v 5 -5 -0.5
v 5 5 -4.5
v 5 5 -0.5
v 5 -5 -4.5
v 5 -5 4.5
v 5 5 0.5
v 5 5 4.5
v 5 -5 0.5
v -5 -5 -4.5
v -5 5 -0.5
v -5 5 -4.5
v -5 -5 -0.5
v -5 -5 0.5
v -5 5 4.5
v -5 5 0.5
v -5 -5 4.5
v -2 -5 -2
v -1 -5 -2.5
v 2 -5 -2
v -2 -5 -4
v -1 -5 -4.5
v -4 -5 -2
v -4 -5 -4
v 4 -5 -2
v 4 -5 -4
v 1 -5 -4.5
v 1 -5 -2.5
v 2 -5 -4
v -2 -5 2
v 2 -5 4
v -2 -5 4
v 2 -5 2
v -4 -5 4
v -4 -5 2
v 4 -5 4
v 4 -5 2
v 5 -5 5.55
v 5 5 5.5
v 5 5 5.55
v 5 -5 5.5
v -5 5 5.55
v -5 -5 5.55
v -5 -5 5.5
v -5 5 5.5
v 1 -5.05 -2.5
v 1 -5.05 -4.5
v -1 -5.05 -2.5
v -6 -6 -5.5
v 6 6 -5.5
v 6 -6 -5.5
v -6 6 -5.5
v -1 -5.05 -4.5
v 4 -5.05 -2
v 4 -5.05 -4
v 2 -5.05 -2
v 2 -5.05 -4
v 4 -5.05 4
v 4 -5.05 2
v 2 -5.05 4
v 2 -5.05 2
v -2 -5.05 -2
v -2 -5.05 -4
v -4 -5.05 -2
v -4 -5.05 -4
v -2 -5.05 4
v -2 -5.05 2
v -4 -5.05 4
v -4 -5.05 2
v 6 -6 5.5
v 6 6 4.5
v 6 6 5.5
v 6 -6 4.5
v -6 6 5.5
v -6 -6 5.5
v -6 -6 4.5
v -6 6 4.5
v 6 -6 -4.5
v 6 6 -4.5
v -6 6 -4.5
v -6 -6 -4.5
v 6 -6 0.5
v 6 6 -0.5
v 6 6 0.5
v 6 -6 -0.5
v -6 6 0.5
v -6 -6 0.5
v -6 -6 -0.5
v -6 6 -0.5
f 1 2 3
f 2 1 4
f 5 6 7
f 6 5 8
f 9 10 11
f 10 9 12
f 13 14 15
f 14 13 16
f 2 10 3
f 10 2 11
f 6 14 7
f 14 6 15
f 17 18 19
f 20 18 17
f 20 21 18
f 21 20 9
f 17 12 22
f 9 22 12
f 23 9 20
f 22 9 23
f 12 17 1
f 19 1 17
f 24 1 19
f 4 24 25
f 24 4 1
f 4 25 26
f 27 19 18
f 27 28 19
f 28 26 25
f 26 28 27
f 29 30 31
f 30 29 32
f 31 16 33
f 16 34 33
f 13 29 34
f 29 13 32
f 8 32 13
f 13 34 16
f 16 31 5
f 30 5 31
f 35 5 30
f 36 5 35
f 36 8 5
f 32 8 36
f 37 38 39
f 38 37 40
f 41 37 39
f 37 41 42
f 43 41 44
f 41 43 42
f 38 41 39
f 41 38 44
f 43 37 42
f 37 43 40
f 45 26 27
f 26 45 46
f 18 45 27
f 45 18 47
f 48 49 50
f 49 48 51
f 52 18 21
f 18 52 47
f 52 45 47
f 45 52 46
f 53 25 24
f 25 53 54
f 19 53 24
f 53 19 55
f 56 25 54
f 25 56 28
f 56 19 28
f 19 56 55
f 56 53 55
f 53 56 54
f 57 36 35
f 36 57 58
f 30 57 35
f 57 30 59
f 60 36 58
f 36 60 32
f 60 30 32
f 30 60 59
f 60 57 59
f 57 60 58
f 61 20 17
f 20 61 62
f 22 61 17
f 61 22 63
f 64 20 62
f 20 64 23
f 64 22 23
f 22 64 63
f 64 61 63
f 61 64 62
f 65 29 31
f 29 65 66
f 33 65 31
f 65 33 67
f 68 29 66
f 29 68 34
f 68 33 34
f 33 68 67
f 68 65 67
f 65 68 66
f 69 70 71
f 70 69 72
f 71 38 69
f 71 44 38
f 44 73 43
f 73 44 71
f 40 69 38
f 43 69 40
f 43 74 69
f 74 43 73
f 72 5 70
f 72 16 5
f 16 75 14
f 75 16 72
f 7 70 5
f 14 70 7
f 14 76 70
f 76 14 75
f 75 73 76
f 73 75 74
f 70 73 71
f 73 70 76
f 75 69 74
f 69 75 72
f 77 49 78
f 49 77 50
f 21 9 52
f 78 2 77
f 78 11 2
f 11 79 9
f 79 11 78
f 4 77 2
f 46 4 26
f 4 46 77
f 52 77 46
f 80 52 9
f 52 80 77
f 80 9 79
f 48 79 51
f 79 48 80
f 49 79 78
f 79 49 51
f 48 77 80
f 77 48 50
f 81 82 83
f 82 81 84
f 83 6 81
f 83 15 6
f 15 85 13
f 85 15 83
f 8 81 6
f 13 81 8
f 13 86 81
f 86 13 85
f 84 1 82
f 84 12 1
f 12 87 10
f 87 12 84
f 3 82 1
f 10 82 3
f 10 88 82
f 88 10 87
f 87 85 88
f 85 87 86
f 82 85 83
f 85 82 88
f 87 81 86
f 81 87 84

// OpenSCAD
module Building_02() {
 
    module door(door_size =[10,10,10] , coord =[0,0,0]){
      color("#a59f8b")
      translate([coord[0],coord[1],coord[2]])
      cube([door_size[0],door_size[1],door_size[2]], center= true);
    }
    
    
    union(){
    color("#132919")
    cube([10,10,10],center=true);
    
    
    translate([0,0,5.5])
    color("#d1c093")
    cube([10,10,0.1],center=true);
    
    // Doors
    color("#a59f8b")
    translate([0,-5,-4])
    cube([2,0.1,3],center=true);
    
    
    // Windows
    translate([3,-5,-3]){
    color("#9fcbd0")
    cube([2,0.1,2],center=true);
    }
    
    translate([3,-5,3]){
    color("#9fcbd0")
    cube([2,0.1,2],center=true);
    }
    
    translate([-3,-5,-3]){
    color("#9fcbd0")
    cube([2,0.1,2],center=true);
    }
    
    translate([-3,-5,3]){
    color("#9fcbd0")
    cube([2,0.1,2],center=true);
    }
     
    // Roof
    translate([0,0,5])
    color("#a59f8b")
    cube([12,12,1],center=true);
    
    translate([0,0,-5]){
    color("#a59f8b")
    cube([12,12,1],center=true);
    }
    
    translate([0,0,0]){
    color("#a59f8b")
    cube([12,12,1],center=true);
    }
    
    }
}


Building_02();
